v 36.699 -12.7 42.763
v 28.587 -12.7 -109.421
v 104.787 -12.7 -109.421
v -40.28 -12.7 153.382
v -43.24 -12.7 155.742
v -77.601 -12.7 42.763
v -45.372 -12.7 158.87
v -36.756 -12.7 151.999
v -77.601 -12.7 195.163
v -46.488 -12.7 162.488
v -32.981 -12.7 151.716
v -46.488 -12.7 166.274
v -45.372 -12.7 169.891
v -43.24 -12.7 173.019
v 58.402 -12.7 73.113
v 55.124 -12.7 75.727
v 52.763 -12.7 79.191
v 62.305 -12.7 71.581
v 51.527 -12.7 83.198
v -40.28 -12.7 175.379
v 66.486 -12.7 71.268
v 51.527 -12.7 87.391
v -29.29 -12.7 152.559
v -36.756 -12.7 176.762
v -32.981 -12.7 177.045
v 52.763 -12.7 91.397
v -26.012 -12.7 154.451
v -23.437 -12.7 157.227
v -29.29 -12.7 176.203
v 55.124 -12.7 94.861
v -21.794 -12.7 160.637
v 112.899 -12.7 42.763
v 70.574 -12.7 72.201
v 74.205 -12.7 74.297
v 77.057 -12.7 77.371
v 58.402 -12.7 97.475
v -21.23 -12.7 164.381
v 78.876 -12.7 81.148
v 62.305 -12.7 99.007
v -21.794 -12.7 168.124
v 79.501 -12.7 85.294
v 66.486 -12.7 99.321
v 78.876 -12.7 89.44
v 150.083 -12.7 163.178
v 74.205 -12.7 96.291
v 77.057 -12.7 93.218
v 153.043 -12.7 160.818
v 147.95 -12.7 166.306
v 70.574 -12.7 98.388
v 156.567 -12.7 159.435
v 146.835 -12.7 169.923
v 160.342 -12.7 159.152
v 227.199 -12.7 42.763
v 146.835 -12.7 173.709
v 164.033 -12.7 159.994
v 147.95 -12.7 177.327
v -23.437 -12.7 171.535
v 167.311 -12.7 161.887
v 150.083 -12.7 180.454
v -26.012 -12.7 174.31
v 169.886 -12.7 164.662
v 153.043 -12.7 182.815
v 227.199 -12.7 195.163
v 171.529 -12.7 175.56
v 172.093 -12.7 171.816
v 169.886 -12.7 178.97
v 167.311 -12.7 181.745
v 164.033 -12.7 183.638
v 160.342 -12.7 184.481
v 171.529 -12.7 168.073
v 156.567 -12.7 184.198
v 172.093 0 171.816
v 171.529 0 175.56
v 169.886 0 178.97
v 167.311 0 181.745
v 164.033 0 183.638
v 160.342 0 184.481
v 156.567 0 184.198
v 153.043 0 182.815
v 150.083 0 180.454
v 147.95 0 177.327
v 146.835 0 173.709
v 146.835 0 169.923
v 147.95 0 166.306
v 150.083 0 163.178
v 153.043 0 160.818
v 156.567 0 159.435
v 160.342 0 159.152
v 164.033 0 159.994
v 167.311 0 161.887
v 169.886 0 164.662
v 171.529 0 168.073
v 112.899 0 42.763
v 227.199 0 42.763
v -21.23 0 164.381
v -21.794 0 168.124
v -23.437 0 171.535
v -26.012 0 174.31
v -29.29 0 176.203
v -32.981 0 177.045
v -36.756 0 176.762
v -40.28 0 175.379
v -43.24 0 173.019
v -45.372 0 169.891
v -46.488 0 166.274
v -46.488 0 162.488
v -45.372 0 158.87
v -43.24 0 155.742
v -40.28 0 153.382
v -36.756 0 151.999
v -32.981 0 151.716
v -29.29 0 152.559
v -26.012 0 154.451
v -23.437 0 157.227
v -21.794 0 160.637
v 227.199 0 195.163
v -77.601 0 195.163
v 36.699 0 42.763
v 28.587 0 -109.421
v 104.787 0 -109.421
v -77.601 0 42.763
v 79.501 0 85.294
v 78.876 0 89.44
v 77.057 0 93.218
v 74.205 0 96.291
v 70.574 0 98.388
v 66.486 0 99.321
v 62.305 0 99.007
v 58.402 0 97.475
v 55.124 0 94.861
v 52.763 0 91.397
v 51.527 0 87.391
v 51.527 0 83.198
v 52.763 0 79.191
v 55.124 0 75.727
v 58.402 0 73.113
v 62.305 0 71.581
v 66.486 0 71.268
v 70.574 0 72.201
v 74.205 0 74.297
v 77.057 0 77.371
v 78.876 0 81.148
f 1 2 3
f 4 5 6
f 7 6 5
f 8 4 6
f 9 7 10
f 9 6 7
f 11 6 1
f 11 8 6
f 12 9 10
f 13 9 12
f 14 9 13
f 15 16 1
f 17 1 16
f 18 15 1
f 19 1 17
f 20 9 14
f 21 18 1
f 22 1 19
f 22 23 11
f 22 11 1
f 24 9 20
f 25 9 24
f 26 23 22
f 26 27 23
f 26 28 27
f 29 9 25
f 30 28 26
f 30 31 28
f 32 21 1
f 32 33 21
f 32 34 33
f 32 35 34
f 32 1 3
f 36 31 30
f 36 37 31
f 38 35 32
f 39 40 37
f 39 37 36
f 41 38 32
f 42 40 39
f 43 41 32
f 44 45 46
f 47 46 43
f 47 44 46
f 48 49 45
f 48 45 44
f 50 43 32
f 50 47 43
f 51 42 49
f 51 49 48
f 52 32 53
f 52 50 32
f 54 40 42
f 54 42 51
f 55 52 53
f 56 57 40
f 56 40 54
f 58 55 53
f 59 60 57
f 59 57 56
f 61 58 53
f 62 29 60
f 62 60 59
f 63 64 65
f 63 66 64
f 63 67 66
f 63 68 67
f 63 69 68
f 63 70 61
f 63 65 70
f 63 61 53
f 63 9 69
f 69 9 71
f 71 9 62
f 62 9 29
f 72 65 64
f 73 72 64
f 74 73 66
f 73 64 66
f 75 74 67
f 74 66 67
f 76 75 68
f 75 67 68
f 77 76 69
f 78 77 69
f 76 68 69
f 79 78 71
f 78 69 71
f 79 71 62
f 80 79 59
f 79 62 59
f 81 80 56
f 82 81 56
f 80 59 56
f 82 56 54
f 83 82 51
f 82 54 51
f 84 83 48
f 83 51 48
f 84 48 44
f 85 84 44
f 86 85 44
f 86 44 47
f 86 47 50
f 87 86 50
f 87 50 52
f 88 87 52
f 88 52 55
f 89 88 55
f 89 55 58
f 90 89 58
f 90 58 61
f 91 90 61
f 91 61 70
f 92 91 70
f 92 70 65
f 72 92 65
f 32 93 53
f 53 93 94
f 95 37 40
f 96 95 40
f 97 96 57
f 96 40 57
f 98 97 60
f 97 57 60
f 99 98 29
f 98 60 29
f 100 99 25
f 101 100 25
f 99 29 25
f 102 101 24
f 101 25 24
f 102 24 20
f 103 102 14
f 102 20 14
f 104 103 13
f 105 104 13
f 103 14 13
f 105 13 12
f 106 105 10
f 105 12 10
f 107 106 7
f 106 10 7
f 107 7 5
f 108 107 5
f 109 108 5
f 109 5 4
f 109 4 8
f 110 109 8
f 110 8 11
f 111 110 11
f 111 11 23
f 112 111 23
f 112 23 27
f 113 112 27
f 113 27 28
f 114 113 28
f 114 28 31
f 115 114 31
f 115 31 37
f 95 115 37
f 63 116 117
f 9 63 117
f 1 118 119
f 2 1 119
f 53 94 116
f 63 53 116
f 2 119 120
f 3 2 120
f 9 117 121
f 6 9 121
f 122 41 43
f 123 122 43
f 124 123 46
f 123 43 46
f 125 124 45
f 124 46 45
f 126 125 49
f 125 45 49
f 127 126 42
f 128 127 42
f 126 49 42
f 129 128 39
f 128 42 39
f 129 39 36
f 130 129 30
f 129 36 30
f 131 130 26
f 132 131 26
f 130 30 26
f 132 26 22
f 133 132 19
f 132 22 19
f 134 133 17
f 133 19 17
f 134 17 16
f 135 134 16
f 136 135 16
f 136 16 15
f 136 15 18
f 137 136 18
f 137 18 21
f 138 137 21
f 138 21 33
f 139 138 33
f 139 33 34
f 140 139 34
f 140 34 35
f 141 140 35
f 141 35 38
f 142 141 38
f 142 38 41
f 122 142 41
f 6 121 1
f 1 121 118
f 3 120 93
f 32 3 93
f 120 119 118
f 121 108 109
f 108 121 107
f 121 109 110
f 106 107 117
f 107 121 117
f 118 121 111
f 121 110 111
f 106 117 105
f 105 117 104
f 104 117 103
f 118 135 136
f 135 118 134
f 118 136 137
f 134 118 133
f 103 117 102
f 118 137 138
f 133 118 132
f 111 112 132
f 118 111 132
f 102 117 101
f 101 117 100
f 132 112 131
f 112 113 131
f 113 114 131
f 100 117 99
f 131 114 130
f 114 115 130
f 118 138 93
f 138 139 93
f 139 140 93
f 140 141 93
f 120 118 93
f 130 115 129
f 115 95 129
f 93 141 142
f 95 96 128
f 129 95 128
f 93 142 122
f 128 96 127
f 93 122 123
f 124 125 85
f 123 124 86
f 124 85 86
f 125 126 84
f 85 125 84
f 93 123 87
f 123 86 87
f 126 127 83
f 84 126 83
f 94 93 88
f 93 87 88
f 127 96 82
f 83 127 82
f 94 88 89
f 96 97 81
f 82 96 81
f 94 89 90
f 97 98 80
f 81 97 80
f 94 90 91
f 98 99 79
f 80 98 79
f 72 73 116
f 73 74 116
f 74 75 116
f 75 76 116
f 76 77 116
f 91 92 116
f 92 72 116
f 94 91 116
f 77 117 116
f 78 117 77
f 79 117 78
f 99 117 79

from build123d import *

# Parameters (mm, degrees)
F1_DEPTH = 12.7
F2_R     = 12.7
F2_R_2   = 14.065671
F3_DEPTH = 61.214


with BuildPart() as f1:
    # F0 (on Front) → F1 (new body)
    with BuildSketch(Plane.XZ):
        Polygon((-77.600956, 42.763185), (36.699044, 42.763185), (28.587316, -109.420782), (104.787316, -109.420782), (112.899044, 42.763185), (227.199044, 42.763185), (227.199044, 195.163185), (-77.600956, 195.163185), align=None)
    extrude(amount=F1_DEPTH)

    # F2 (on face) → F3 (cut)
    with BuildSketch(Plane.XZ.offset(12.7)):
        with Locations((-33.92983, 164.380682)):
            Circle(F2_R)
        with Locations((65.435274, 85.294179)):
            Circle(F2_R_2)
        with Locations((159.39275, 171.816179)):
            Circle(F2_R)
    extrude(amount=-F3_DEPTH, mode=Mode.SUBTRACT)


solid = f1.part
